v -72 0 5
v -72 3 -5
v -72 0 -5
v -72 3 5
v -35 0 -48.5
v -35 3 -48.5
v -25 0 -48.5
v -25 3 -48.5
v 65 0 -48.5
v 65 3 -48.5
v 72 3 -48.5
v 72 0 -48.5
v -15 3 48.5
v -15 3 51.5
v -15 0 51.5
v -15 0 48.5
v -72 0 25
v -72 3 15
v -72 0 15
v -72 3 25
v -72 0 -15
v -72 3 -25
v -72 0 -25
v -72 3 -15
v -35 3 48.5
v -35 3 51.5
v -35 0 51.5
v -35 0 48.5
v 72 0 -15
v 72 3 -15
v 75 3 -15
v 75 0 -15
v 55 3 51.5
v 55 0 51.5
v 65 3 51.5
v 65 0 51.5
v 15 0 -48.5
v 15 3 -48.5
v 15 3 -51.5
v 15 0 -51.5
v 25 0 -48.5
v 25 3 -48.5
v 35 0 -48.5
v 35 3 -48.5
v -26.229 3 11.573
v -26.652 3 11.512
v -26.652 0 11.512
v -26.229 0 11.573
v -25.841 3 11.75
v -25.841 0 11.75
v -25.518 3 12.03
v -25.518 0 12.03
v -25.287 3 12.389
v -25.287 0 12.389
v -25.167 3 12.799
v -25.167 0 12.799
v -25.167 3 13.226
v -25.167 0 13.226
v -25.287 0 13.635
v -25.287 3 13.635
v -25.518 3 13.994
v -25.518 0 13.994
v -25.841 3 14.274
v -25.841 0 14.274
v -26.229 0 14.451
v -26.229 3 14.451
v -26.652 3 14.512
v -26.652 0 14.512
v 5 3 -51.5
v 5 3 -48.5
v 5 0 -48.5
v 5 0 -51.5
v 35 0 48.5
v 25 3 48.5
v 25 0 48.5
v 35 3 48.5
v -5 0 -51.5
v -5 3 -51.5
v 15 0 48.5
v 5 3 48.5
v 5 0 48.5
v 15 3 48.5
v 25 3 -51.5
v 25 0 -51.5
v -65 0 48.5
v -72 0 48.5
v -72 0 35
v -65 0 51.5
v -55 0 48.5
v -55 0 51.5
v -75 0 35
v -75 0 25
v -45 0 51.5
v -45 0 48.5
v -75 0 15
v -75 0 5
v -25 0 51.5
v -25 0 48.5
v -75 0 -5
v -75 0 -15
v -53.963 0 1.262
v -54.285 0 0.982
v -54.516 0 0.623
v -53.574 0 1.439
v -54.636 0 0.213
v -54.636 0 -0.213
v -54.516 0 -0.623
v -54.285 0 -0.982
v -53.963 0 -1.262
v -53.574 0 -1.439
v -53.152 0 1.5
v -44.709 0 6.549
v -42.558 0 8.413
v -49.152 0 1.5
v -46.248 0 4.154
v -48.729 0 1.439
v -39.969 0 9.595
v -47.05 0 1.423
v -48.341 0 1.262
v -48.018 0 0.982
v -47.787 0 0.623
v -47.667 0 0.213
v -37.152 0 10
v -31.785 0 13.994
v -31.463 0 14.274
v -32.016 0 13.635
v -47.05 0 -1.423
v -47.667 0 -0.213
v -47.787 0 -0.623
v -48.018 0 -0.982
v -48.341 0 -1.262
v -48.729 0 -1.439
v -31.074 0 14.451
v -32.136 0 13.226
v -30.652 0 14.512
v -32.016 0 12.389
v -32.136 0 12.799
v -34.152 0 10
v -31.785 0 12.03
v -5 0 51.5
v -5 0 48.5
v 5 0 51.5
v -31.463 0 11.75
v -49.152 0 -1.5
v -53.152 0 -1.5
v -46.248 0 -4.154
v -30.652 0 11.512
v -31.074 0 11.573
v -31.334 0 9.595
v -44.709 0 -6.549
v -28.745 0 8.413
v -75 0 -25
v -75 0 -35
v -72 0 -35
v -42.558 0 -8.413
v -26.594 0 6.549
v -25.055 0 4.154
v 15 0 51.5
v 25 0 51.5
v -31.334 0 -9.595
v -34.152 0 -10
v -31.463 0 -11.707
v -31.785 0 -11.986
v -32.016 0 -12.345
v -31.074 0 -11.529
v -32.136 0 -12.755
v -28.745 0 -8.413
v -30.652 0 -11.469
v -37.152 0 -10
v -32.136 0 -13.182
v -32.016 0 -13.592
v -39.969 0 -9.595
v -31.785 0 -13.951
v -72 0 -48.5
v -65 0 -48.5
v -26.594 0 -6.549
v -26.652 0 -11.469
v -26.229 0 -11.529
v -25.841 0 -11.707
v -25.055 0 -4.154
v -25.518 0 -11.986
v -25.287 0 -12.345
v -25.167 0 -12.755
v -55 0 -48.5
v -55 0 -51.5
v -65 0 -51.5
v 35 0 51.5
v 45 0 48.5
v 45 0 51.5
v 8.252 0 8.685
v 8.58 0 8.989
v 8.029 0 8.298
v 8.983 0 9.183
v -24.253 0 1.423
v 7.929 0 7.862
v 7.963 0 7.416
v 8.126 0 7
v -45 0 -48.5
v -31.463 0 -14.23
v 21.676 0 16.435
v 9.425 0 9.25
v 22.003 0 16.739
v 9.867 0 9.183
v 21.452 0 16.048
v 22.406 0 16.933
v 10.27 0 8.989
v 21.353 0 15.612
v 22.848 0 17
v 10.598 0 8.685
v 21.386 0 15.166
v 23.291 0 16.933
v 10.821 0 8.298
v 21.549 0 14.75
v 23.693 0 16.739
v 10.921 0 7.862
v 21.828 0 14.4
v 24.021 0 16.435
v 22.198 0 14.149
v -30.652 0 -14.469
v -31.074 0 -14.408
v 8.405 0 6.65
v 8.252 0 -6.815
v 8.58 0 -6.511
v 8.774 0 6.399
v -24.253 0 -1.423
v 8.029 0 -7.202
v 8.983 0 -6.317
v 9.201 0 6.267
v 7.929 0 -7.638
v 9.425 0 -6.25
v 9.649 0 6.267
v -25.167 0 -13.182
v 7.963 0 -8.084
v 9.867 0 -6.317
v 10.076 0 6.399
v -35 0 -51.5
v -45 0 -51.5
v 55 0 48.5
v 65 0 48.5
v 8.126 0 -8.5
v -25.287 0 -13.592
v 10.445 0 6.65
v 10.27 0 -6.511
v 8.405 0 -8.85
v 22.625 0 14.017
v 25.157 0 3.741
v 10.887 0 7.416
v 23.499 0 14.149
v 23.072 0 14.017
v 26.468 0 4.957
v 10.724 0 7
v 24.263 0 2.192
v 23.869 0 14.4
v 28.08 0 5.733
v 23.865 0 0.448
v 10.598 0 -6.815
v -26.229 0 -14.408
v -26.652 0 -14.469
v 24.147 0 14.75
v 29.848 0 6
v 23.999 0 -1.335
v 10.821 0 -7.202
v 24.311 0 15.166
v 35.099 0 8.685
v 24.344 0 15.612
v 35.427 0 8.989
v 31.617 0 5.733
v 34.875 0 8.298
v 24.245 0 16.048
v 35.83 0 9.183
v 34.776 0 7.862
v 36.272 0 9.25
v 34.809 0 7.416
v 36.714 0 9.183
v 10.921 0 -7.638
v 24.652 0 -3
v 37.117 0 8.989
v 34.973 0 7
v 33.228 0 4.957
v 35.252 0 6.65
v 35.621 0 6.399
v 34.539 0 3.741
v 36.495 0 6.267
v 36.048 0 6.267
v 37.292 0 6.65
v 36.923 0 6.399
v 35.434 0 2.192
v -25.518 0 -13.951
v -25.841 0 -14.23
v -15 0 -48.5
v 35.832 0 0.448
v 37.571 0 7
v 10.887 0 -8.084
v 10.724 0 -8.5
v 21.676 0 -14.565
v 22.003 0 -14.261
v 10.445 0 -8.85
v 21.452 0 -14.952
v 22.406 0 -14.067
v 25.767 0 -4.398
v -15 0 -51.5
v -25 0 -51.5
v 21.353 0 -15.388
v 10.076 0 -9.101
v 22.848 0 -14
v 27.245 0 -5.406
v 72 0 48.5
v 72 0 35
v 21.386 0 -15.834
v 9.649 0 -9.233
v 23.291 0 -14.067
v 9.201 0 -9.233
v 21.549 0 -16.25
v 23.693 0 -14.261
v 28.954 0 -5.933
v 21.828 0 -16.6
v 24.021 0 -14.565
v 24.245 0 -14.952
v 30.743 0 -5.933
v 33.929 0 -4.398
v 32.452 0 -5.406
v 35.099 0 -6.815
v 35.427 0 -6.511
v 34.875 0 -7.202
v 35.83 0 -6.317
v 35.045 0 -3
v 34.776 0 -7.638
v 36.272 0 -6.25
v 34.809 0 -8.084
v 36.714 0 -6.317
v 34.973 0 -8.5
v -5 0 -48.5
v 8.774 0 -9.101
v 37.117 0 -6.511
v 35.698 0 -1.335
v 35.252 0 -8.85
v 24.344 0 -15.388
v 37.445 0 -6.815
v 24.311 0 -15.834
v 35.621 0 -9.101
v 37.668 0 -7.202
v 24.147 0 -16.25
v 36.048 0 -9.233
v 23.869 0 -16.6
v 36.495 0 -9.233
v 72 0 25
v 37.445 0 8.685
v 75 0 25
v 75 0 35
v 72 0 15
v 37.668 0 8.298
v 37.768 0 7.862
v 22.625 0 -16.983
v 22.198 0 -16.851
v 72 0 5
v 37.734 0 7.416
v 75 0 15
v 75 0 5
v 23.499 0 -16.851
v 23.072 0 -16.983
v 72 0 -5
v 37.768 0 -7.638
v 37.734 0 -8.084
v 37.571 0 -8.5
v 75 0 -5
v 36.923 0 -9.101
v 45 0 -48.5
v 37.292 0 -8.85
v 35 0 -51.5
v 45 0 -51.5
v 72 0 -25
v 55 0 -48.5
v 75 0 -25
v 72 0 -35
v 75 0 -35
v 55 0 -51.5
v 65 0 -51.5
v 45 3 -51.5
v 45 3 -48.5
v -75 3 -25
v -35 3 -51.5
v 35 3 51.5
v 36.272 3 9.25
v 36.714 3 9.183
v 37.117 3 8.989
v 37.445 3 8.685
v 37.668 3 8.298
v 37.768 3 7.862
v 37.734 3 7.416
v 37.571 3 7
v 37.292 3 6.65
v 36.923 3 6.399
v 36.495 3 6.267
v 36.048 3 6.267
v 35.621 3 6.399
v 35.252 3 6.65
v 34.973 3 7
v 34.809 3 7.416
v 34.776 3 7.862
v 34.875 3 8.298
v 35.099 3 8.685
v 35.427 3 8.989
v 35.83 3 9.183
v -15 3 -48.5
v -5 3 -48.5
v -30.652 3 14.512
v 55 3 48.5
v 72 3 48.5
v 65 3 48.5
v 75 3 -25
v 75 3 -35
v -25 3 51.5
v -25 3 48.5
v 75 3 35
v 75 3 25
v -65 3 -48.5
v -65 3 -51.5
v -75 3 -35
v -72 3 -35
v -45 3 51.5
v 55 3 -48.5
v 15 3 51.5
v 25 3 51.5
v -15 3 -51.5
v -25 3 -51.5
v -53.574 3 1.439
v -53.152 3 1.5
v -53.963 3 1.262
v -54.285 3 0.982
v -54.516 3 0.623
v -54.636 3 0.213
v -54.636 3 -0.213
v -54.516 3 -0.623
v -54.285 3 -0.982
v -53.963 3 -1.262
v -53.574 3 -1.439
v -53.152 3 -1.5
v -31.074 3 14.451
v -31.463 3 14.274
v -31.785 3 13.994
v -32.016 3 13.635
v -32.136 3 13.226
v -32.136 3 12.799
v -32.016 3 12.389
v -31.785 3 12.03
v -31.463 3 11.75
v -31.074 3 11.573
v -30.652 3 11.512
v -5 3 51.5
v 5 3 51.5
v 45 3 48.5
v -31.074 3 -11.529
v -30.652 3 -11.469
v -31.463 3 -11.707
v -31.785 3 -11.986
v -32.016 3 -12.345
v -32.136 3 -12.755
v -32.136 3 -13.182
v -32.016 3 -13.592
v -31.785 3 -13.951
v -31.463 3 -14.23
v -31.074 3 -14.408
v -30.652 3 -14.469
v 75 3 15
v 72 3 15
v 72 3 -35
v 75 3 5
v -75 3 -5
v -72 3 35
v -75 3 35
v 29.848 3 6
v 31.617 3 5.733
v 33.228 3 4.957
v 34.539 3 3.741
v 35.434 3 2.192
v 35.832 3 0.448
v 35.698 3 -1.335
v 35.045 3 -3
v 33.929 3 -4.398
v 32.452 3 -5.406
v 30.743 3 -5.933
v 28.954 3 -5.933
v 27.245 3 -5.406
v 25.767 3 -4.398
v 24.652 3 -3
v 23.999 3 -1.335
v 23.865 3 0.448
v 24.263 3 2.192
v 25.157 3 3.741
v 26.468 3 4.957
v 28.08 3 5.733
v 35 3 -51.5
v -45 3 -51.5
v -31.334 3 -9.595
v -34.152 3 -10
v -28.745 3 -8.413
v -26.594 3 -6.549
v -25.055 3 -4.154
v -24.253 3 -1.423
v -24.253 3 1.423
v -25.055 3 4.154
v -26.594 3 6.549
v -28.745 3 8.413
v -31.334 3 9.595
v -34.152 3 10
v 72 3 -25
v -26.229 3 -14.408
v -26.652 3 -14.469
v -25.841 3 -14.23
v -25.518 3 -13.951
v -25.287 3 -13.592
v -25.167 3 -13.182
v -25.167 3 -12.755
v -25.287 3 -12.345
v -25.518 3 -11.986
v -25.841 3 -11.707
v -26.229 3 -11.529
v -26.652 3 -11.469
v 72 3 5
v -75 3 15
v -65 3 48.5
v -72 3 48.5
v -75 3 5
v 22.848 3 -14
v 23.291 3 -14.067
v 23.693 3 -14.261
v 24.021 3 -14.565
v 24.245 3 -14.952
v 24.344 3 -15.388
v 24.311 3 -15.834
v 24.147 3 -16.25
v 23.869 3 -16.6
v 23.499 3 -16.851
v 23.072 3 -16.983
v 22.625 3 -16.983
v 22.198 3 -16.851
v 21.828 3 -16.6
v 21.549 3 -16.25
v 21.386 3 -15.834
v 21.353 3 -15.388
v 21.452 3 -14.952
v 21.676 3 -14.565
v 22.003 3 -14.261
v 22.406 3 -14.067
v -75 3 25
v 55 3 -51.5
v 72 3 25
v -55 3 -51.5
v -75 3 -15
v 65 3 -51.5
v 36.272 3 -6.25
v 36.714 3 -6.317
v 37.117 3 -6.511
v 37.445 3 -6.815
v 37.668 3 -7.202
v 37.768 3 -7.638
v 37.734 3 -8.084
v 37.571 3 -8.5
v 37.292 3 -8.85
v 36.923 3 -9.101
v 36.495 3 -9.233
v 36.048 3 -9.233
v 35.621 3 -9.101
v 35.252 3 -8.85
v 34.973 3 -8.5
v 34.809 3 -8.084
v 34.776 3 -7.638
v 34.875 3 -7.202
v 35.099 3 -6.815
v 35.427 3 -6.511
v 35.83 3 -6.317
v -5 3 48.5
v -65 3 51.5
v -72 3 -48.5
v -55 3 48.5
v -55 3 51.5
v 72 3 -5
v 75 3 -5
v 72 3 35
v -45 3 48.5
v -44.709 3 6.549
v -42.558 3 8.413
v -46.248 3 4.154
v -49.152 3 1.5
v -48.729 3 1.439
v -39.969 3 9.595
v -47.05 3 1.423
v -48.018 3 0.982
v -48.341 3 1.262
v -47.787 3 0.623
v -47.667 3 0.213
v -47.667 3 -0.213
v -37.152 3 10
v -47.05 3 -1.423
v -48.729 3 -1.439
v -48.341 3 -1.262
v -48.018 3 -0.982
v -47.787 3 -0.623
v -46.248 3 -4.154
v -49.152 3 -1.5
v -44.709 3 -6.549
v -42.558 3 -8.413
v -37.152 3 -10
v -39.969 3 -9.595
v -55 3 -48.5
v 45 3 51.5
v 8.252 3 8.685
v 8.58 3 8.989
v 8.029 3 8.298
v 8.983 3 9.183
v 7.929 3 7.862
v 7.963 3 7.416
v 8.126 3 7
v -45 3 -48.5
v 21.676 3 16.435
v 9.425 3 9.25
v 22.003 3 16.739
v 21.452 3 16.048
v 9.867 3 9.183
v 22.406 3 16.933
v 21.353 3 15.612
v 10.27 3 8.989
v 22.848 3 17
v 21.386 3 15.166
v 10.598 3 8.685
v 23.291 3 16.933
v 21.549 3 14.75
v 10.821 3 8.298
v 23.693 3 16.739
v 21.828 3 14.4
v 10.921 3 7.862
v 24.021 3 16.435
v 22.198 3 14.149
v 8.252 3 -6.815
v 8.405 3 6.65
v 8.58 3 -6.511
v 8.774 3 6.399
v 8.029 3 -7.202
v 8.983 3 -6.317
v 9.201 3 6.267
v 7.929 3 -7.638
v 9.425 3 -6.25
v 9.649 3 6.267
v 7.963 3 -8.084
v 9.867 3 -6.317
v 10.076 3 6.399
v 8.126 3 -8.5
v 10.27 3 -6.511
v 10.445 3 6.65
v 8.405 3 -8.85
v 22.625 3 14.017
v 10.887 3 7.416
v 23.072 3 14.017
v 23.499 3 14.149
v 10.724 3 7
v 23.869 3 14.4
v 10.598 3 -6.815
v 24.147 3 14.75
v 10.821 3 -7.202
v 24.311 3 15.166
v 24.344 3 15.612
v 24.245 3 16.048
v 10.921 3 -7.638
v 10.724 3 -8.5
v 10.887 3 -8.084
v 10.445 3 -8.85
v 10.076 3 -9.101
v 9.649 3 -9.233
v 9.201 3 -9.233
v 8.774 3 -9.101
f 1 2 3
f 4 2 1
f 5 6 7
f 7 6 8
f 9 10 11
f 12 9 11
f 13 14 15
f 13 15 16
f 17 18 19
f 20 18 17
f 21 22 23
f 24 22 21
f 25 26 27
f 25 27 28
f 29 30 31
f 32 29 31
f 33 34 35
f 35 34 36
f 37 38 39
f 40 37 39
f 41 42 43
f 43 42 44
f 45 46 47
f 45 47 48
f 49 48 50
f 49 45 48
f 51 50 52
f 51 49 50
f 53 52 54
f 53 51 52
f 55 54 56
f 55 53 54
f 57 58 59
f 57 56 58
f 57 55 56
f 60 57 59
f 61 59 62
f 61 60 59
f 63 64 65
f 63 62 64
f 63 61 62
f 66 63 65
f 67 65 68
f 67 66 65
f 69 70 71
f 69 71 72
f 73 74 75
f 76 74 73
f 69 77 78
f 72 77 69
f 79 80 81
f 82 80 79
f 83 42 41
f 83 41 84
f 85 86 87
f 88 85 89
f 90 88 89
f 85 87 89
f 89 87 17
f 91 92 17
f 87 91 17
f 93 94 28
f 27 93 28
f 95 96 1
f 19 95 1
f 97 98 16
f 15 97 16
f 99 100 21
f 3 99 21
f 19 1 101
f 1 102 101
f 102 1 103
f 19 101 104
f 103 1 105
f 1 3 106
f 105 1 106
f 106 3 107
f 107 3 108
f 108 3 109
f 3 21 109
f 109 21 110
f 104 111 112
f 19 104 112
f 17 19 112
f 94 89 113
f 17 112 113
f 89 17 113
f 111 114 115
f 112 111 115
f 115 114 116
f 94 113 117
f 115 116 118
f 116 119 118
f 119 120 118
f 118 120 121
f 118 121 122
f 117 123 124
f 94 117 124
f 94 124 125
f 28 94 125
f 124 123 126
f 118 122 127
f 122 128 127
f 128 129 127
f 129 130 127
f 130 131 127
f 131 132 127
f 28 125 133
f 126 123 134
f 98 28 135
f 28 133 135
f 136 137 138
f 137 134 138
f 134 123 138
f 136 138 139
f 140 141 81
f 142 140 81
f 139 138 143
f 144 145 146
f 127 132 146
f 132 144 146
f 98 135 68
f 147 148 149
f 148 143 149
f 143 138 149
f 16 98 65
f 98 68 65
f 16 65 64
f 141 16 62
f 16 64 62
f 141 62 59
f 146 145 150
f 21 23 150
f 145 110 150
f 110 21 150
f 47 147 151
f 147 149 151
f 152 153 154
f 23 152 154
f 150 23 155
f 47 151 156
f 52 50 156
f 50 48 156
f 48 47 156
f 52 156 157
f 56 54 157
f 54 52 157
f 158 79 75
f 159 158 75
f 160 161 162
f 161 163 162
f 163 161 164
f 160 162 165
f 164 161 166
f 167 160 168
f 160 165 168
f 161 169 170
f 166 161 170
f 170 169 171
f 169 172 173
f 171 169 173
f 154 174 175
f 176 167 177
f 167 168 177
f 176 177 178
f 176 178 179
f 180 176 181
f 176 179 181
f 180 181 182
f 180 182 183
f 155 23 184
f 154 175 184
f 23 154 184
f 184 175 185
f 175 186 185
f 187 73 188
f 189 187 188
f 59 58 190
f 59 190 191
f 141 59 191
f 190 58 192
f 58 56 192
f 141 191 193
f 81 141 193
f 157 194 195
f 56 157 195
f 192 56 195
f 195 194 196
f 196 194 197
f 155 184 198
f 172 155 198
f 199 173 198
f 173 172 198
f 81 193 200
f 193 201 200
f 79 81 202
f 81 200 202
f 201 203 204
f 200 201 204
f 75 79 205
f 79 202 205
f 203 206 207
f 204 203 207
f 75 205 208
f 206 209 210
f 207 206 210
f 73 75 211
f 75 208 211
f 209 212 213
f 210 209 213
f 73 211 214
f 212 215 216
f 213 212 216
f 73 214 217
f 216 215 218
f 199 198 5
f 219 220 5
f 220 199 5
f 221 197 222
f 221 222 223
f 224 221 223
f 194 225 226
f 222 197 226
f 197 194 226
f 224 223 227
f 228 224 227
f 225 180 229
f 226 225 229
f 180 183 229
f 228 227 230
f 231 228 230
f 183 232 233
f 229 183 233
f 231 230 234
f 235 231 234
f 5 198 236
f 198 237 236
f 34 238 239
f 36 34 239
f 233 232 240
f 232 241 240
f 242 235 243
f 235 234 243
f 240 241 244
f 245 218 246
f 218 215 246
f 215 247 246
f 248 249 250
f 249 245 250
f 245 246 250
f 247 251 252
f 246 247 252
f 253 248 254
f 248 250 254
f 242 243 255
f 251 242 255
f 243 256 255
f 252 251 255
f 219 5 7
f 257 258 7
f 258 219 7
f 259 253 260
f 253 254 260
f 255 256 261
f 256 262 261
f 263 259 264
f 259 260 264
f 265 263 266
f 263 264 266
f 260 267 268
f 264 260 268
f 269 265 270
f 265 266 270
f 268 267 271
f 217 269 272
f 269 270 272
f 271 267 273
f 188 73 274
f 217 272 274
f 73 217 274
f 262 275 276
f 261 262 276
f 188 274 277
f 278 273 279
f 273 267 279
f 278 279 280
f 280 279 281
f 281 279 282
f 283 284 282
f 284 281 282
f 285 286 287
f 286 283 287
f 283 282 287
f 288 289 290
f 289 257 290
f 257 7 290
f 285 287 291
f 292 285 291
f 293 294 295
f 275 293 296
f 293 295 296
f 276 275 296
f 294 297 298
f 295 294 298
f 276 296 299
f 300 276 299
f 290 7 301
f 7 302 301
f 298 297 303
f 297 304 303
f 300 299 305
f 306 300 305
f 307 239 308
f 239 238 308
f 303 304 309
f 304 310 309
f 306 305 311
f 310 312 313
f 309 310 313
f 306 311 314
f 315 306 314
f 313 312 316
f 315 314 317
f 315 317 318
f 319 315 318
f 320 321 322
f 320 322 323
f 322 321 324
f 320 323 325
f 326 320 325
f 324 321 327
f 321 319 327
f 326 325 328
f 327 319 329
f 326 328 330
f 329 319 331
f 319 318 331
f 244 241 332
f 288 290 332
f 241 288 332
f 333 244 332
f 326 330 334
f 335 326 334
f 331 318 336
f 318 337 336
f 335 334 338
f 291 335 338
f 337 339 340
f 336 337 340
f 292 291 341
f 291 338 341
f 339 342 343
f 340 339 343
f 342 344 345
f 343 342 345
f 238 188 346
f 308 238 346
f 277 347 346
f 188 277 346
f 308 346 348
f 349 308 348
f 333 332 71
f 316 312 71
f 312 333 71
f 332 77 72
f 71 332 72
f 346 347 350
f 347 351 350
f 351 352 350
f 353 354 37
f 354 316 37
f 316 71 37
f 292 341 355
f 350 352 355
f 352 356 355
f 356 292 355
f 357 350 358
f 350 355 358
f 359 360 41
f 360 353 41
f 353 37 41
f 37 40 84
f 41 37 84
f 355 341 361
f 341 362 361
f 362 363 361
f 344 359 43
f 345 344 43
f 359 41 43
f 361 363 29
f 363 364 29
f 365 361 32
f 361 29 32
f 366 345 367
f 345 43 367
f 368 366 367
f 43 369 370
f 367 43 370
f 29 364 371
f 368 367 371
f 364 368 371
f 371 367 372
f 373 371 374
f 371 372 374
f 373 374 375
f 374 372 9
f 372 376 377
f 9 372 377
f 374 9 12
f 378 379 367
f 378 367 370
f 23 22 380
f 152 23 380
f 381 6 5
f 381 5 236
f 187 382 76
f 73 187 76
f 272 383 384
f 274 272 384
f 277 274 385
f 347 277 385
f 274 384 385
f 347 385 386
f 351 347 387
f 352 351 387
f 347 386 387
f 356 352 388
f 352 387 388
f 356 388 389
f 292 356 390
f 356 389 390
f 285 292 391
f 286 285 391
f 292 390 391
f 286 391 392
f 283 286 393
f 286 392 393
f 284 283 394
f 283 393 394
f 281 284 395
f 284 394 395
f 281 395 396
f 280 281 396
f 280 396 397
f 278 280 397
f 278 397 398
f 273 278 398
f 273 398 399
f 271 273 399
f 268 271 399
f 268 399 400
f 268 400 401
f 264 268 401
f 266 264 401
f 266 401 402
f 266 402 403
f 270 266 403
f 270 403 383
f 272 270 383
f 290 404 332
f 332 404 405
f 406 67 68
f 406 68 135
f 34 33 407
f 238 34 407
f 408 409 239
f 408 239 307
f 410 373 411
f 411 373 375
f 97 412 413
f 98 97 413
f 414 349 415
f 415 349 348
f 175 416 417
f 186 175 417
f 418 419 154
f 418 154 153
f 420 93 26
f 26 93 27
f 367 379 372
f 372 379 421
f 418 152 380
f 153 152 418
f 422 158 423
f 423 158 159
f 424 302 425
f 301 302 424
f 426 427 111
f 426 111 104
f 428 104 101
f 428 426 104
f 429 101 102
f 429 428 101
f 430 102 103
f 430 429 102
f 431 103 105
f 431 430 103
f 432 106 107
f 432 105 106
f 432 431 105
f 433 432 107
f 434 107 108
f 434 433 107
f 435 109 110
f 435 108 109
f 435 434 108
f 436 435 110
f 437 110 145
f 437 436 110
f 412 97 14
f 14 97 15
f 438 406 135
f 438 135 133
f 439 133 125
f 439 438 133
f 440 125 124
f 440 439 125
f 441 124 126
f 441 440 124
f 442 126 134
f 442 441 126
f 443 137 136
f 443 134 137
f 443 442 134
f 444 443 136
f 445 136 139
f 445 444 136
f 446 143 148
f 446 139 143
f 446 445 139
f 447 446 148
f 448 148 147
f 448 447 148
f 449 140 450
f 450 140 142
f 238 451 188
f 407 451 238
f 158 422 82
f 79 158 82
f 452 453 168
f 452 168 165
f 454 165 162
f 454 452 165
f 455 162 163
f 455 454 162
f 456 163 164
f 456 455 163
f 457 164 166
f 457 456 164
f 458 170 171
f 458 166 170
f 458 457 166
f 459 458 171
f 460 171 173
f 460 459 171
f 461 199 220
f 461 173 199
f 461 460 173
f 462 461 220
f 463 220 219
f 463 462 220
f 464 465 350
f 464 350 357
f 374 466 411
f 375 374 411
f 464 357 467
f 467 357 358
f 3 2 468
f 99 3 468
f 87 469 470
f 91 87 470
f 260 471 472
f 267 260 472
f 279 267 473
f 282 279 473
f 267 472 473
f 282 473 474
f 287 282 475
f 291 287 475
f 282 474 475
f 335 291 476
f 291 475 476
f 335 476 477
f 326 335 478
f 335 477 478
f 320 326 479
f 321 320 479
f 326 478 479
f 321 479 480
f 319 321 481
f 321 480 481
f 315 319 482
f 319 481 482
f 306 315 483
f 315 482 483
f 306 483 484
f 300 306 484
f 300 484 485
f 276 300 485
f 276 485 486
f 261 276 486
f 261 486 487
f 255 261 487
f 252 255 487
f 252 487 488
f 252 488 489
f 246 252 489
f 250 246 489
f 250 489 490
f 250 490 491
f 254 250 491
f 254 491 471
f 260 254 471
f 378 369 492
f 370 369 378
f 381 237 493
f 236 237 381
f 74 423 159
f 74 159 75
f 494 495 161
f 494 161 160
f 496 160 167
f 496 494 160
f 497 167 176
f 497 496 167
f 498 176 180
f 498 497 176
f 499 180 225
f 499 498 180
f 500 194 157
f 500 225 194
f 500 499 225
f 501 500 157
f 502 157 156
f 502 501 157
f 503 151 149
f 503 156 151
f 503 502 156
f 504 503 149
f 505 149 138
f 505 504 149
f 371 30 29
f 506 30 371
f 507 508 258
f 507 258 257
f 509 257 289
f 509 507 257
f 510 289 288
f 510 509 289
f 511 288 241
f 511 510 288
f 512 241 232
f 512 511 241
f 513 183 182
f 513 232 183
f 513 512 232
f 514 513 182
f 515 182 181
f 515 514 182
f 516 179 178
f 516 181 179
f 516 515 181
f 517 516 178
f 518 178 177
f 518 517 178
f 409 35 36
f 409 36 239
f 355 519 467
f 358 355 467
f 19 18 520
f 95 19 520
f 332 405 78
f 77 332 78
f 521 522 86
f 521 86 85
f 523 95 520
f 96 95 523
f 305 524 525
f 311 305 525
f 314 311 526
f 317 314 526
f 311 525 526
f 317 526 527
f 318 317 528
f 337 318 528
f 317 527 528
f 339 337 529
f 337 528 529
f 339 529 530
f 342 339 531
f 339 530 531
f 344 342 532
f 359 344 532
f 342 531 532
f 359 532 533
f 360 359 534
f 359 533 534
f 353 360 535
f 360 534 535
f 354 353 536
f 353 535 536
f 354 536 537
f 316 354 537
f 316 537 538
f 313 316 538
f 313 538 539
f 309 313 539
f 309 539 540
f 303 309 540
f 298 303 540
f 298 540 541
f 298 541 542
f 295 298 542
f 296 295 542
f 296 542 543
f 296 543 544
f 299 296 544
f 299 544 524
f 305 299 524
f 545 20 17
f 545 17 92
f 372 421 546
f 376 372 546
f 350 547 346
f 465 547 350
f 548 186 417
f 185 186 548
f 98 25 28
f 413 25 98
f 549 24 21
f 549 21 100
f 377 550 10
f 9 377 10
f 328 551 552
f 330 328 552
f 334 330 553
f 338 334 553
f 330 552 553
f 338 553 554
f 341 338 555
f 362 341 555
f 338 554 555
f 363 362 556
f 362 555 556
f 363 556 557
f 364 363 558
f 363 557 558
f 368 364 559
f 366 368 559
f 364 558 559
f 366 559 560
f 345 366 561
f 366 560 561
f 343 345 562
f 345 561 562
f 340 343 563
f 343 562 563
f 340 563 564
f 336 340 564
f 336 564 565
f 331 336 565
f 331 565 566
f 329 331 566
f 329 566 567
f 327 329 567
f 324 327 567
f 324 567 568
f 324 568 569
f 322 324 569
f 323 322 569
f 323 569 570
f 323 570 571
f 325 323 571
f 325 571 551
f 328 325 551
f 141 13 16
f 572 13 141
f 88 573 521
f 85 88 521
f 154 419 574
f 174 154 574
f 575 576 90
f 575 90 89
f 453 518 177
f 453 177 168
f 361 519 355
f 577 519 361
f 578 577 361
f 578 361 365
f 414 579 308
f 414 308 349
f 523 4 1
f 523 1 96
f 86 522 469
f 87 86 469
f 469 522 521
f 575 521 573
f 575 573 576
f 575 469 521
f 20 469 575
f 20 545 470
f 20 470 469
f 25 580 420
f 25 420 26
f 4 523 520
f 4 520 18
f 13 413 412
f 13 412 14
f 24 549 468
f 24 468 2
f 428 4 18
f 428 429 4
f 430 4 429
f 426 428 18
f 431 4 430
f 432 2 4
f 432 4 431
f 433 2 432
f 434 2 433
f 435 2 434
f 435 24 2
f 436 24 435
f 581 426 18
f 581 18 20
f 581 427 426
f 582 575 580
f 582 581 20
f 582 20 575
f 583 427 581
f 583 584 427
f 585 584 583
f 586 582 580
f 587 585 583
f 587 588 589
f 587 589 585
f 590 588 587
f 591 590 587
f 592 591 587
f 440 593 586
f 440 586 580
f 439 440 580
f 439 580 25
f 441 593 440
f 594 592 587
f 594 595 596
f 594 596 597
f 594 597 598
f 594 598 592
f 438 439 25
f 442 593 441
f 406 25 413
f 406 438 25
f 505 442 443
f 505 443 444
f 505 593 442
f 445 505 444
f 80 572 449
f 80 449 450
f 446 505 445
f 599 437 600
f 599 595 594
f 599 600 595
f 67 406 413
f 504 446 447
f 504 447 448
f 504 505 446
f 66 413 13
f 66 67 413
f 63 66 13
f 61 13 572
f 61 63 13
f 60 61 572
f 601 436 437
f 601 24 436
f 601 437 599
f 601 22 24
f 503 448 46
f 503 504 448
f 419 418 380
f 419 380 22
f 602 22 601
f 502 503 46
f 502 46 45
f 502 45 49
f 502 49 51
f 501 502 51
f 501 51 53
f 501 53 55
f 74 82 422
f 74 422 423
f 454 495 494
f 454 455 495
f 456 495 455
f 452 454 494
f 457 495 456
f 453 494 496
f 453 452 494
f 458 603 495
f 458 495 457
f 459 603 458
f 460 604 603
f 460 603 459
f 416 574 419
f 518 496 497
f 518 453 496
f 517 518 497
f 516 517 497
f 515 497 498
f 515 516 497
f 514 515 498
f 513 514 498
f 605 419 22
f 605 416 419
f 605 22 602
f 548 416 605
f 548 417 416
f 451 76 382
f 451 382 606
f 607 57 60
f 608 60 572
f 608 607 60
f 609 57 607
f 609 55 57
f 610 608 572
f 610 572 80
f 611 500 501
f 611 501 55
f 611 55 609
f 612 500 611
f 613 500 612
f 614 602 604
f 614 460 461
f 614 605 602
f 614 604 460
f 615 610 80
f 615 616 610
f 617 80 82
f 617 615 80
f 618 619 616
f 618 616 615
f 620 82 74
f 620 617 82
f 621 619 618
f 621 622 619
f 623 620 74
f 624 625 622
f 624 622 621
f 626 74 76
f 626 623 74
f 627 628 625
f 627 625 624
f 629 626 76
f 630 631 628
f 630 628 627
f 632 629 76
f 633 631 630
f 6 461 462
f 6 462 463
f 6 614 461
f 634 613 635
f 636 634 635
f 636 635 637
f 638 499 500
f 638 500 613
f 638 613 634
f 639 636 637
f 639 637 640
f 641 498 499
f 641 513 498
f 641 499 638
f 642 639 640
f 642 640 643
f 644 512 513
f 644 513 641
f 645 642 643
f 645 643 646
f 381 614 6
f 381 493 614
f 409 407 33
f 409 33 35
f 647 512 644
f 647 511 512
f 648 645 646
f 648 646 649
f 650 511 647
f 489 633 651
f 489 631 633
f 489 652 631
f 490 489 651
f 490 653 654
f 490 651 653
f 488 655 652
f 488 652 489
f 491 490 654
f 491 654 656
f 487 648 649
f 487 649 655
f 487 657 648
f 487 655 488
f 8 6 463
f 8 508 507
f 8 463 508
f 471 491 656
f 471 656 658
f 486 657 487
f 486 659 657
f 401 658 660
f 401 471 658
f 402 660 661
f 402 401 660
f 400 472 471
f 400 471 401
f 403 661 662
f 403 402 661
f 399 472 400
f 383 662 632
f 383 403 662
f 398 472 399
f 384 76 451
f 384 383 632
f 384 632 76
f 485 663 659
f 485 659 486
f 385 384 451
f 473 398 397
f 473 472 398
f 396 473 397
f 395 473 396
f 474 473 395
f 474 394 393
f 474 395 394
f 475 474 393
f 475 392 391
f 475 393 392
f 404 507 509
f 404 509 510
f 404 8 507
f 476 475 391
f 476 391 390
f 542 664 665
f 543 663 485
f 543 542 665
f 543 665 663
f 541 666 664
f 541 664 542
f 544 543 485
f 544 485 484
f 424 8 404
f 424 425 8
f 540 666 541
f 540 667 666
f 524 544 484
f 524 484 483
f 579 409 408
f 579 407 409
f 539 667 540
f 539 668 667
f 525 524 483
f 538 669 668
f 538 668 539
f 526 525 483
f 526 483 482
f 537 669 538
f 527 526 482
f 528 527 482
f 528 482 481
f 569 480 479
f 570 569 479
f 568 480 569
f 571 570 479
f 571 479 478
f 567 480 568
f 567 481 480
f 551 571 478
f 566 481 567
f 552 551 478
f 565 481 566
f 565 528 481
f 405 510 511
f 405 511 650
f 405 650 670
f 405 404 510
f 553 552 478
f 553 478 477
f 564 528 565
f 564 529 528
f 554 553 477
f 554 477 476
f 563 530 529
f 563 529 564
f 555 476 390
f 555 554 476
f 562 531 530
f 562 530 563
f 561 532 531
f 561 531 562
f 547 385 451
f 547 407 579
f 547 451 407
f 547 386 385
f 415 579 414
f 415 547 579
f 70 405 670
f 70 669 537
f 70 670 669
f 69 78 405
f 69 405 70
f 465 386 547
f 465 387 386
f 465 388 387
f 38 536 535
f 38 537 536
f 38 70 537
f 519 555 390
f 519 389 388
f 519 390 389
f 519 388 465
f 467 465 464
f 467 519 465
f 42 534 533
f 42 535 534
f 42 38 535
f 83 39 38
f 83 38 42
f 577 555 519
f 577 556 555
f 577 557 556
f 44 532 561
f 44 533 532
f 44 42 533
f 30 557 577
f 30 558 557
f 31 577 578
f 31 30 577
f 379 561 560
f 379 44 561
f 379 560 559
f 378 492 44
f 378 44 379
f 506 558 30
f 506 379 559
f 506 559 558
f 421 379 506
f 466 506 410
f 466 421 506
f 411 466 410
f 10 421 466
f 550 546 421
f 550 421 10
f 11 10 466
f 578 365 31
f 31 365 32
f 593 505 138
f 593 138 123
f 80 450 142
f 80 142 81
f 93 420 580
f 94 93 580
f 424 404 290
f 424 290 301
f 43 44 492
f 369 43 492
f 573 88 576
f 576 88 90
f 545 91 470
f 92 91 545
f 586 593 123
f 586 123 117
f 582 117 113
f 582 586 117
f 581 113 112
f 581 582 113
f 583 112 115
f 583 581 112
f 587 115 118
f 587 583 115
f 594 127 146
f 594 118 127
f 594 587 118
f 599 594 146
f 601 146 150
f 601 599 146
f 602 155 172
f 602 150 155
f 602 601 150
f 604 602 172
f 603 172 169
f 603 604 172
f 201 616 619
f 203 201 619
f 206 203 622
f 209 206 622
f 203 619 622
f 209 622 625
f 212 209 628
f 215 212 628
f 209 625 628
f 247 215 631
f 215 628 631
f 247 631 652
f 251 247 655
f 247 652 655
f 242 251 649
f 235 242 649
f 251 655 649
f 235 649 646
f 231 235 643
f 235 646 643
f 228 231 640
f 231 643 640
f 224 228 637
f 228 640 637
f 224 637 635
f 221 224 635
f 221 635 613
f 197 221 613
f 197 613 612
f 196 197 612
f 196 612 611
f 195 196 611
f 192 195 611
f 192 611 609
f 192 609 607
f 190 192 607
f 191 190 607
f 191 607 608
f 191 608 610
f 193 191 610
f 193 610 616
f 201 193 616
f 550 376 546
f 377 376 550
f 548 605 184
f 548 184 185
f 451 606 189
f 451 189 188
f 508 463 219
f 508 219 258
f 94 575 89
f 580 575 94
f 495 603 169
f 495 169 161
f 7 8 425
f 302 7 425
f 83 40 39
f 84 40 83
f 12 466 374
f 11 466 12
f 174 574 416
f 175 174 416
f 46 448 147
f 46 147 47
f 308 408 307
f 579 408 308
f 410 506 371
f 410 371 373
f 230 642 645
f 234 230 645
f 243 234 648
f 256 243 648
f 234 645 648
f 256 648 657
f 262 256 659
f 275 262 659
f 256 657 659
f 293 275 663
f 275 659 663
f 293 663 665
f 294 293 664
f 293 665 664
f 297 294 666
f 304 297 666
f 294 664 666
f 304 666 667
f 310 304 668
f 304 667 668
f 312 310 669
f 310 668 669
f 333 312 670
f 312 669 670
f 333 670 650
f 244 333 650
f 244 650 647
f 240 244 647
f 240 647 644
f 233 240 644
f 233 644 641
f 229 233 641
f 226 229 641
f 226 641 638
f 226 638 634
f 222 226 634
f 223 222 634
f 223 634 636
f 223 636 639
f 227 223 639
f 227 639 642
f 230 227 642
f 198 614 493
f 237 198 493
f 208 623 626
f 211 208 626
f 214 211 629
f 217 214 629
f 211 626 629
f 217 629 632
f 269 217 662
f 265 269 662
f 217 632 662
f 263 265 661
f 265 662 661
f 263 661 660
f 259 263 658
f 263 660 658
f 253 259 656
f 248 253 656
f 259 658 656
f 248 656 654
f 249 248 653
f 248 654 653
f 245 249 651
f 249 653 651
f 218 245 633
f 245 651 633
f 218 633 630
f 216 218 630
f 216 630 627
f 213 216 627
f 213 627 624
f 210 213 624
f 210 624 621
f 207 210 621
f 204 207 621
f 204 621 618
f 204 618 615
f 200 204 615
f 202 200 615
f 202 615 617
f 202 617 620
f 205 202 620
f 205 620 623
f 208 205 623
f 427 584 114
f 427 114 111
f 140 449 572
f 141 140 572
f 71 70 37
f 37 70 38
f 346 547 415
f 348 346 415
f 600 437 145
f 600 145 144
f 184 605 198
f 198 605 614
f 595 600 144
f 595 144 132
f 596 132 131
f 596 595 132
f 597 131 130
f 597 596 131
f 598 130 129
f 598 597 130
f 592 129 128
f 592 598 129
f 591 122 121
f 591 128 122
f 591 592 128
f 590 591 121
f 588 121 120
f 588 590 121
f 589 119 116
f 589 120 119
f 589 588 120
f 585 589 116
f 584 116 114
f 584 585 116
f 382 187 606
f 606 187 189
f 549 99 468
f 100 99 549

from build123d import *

# Parameters (mm, degrees)
SKETCH1_W                 = 150
SKETCH1_H                 = 103
BOSS_EXTRUDE1_DEPTH       = 3
SKETCH2_W                 = 10
SKETCH2_H                 = 3
CUT_EXTRUDE1_DEPTH        = 92.028841583
LPATTERN1_COUNT           = 8
LPATTERN1_PITCH           = 20
MIRROR1_COPY_1_SKETCH_W   = 10
MIRROR1_COPY_1_SKETCH_H   = 3
MIRROR1_COPY_1_DEPTH      = 92.028841583
MIRROR1_COPY_2_SKETCH_W   = 10
MIRROR1_COPY_2_SKETCH_H   = 3
MIRROR1_COPY_2_DEPTH      = 92.028841583
MIRROR1_COPY_3_SKETCH_W   = 10
MIRROR1_COPY_3_SKETCH_H   = 3
MIRROR1_COPY_3_DEPTH      = 92.028841583
MIRROR1_COPY_4_SKETCH_W   = 10
MIRROR1_COPY_4_SKETCH_H   = 3
MIRROR1_COPY_4_DEPTH      = 92.028841583
MIRROR1_COPY_5_SKETCH_W   = 10
MIRROR1_COPY_5_SKETCH_H   = 3
MIRROR1_COPY_5_DEPTH      = 92.028841583
MIRROR1_COPY_6_SKETCH_W   = 10
MIRROR1_COPY_6_SKETCH_H   = 3
MIRROR1_COPY_6_DEPTH      = 92.028841583
MIRROR1_COPY_7_SKETCH_W   = 10
MIRROR1_COPY_7_SKETCH_H   = 3
MIRROR1_COPY_7_DEPTH      = 92.028841583
SKETCH3_W                 = 3
SKETCH3_H                 = 10
CUT_EXTRUDE2_DEPTH        = 92.028841583
LPATTERN2_COUNT           = 5
LPATTERN2_PITCH           = 20
MIRROR2_COPY_1_SKETCH_W   = 3
MIRROR2_COPY_1_SKETCH_H   = 10
MIRROR2_COPY_1_DEPTH      = 92.028841583
MIRROR2_COPY_2_SKETCH_W   = 3
MIRROR2_COPY_2_SKETCH_H   = 10
MIRROR2_COPY_2_DEPTH      = 92.028841583
MIRROR2_COPY_3_SKETCH_W   = 3
MIRROR2_COPY_3_SKETCH_H   = 10
MIRROR2_COPY_3_DEPTH      = 92.028841583
MIRROR2_COPY_4_SKETCH_W   = 3
MIRROR2_COPY_4_SKETCH_H   = 10
MIRROR2_COPY_4_DEPTH      = 92.028841583
SKETCH4_W                 = 3
SKETCH4_H                 = 3.5
CUT_EXTRUDE3_DEPTH        = 92.028841583
SKETCH7_R                 = 6
SKETCH7_R_2               = 1.5
CUT_EXTRUDE4_DEPTH        = 92.028841583
M3X0_5_TAPPED_HOLE3_D     = 3
M3X0_5_TAPPED_HOLE3_DEPTH = 10
M3X0_5_TAPPED_HOLE3_TIP   = 0.901290929


with BuildPart() as part:
    # Sketch1 → Boss-Extrude1 (new body)
    with BuildSketch(Plane(origin=(0, 0, 0), x_dir=(1, 0, 0), z_dir=(0, 1, 0))):
        Rectangle(SKETCH1_W, SKETCH1_H)
    extrude(amount=BOSS_EXTRUDE1_DEPTH)

    # Sketch2 → Cut-Extrude1 (cut, through all)
    with BuildSketch(Plane(origin=(0, 3, 0), x_dir=(1, 0, 0), z_dir=(0, 1, 0))):
        with Locations((70, -50)):
            Rectangle(SKETCH2_W, SKETCH2_H)
    cut_extrude1 = extrude(amount=-CUT_EXTRUDE1_DEPTH, mode=Mode.SUBTRACT)

    # LPattern1: Cut-Extrude1 ×8
    with Locations(*[(-i * LPATTERN1_PITCH, 0, 0) for i in range(1, LPATTERN1_COUNT)]):
        add(cut_extrude1, mode=Mode.SUBTRACT)

    # Mirror1: Cut-Extrude1 across plane
    add(cut_extrude1.mirror(Plane.XY), mode=Mode.SUBTRACT)

    # Mirror1 copy 1 sketch → Mirror1 copy 1 (cut, through all)
    with BuildSketch(Plane(origin=(-20, 3, 0), x_dir=(1, 0, 0), z_dir=(0, 1, 0))):
        with Locations((70, 50)):
            Rectangle(MIRROR1_COPY_1_SKETCH_W, MIRROR1_COPY_1_SKETCH_H)
    extrude(amount=-MIRROR1_COPY_1_DEPTH, mode=Mode.SUBTRACT)

    # Mirror1 copy 2 sketch → Mirror1 copy 2 (cut, through all)
    with BuildSketch(Plane(origin=(-40, 3, 0), x_dir=(1, 0, 0), z_dir=(0, 1, 0))):
        with Locations((70, 50)):
            Rectangle(MIRROR1_COPY_2_SKETCH_W, MIRROR1_COPY_2_SKETCH_H)
    extrude(amount=-MIRROR1_COPY_2_DEPTH, mode=Mode.SUBTRACT)

    # Mirror1 copy 3 sketch → Mirror1 copy 3 (cut, through all)
    with BuildSketch(Plane(origin=(-60, 3, 0), x_dir=(1, 0, 0), z_dir=(0, 1, 0))):
        with Locations((70, 50)):
            Rectangle(MIRROR1_COPY_3_SKETCH_W, MIRROR1_COPY_3_SKETCH_H)
    extrude(amount=-MIRROR1_COPY_3_DEPTH, mode=Mode.SUBTRACT)

    # Mirror1 copy 4 sketch → Mirror1 copy 4 (cut, through all)
    with BuildSketch(Plane(origin=(-80, 3, 0), x_dir=(1, 0, 0), z_dir=(0, 1, 0))):
        with Locations((70, 50)):
            Rectangle(MIRROR1_COPY_4_SKETCH_W, MIRROR1_COPY_4_SKETCH_H)
    extrude(amount=-MIRROR1_COPY_4_DEPTH, mode=Mode.SUBTRACT)

    # Mirror1 copy 5 sketch → Mirror1 copy 5 (cut, through all)
    with BuildSketch(Plane(origin=(-100, 3, 0), x_dir=(1, 0, 0), z_dir=(0, 1, 0))):
        with Locations((70, 50)):
            Rectangle(MIRROR1_COPY_5_SKETCH_W, MIRROR1_COPY_5_SKETCH_H)
    extrude(amount=-MIRROR1_COPY_5_DEPTH, mode=Mode.SUBTRACT)

    # Mirror1 copy 6 sketch → Mirror1 copy 6 (cut, through all)
    with BuildSketch(Plane(origin=(-120, 3, 0), x_dir=(1, 0, 0), z_dir=(0, 1, 0))):
        with Locations((70, 50)):
            Rectangle(MIRROR1_COPY_6_SKETCH_W, MIRROR1_COPY_6_SKETCH_H)
    extrude(amount=-MIRROR1_COPY_6_DEPTH, mode=Mode.SUBTRACT)

    # Mirror1 copy 7 sketch → Mirror1 copy 7 (cut, through all)
    with BuildSketch(Plane(origin=(-140, 3, 0), x_dir=(1, 0, 0), z_dir=(0, 1, 0))):
        with Locations((70, 50)):
            Rectangle(MIRROR1_COPY_7_SKETCH_W, MIRROR1_COPY_7_SKETCH_H)
    extrude(amount=-MIRROR1_COPY_7_DEPTH, mode=Mode.SUBTRACT)

    # Sketch3 → Cut-Extrude2 (cut, through all)
    with BuildSketch(Plane(origin=(0, 3, 0), x_dir=(1, 0, 0), z_dir=(0, 1, 0))):
        with Locations((73.5, 40)):
            Rectangle(SKETCH3_W, SKETCH3_H)
    cut_extrude2 = extrude(amount=-CUT_EXTRUDE2_DEPTH, mode=Mode.SUBTRACT)

    # LPattern2: Cut-Extrude2 ×5
    with Locations(*[(0, 0, i * LPATTERN2_PITCH) for i in range(1, LPATTERN2_COUNT)]):
        add(cut_extrude2, mode=Mode.SUBTRACT)

    # Mirror2: Cut-Extrude2 across plane
    add(cut_extrude2.mirror(Plane(origin=(0, 0, 0), x_dir=(0, 0, 1), z_dir=(1, 0, 0))), mode=Mode.SUBTRACT)

    # Mirror2 copy 1 sketch → Mirror2 copy 1 (cut, through all)
    with BuildSketch(Plane(origin=(0, 3, 20), x_dir=(-1, 0, 0), z_dir=(0, 1, 0))):
        with Locations((73.5, -40)):
            Rectangle(MIRROR2_COPY_1_SKETCH_W, MIRROR2_COPY_1_SKETCH_H)
    extrude(amount=-MIRROR2_COPY_1_DEPTH, mode=Mode.SUBTRACT)

    # Mirror2 copy 2 sketch → Mirror2 copy 2 (cut, through all)
    with BuildSketch(Plane(origin=(0, 3, 40), x_dir=(-1, 0, 0), z_dir=(0, 1, 0))):
        with Locations((73.5, -40)):
            Rectangle(MIRROR2_COPY_2_SKETCH_W, MIRROR2_COPY_2_SKETCH_H)
    extrude(amount=-MIRROR2_COPY_2_DEPTH, mode=Mode.SUBTRACT)

    # Mirror2 copy 3 sketch → Mirror2 copy 3 (cut, through all)
    with BuildSketch(Plane(origin=(0, 3, 60), x_dir=(-1, 0, 0), z_dir=(0, 1, 0))):
        with Locations((73.5, -40)):
            Rectangle(MIRROR2_COPY_3_SKETCH_W, MIRROR2_COPY_3_SKETCH_H)
    extrude(amount=-MIRROR2_COPY_3_DEPTH, mode=Mode.SUBTRACT)

    # Mirror2 copy 4 sketch → Mirror2 copy 4 (cut, through all)
    with BuildSketch(Plane(origin=(0, 3, 80), x_dir=(-1, 0, 0), z_dir=(0, 1, 0))):
        with Locations((73.5, -40)):
            Rectangle(MIRROR2_COPY_4_SKETCH_W, MIRROR2_COPY_4_SKETCH_H)
    extrude(amount=-MIRROR2_COPY_4_DEPTH, mode=Mode.SUBTRACT)

    # Sketch4 → Cut-Extrude3 (cut, through all)
    with BuildSketch(Plane(origin=(0, 3, 0), x_dir=(1, 0, 0), z_dir=(0, 1, 0))):
        with Locations((73.5, 46.75)):
            Rectangle(SKETCH4_W, SKETCH4_H)
        with Locations((-73.5, 46.75)):
            Rectangle(SKETCH4_W, SKETCH4_H)
        with Locations((-73.5, -46.75)):
            Rectangle(SKETCH4_W, SKETCH4_H)
        with Locations((73.5, -46.75)):
            Rectangle(SKETCH4_W, SKETCH4_H)
    extrude(amount=-CUT_EXTRUDE3_DEPTH, mode=Mode.SUBTRACT)

    # Sketch7 → Cut-Extrude4 (cut, through all)
    with BuildSketch(Plane(origin=(0, 3, 0), x_dir=(1, 0, 0), z_dir=(0, 1, 0))):
        with Locations(Location((29.848397993, 0, 0), (0, 0, 270))):
            Circle(SKETCH7_R)
        with Locations(Location((22.848397993, 15.5, 0), (0, 0, 270))):
            Circle(SKETCH7_R_2)
        with Locations(Location((36.271791752, 7.75, 0), (0, 0, 270))):
            Circle(SKETCH7_R_2)
        with Locations(Location((36.271791752, -7.75, 0), (0, 0, 270))):
            Circle(SKETCH7_R_2)
        with Locations(Location((22.848397993, -15.5, 0), (0, 0, 270))):
            Circle(SKETCH7_R_2)
        with Locations(Location((9.425004235, -7.75, 0), (0, 0, 270))):
            Circle(SKETCH7_R_2)
        with Locations(Location((9.425004235, 7.75, 0), (0, 0, 270))):
            Circle(SKETCH7_R_2)
        with BuildLine():
            Line((-34.151602007, -10), (-37.151602007, -10))
            ThreePointArc((-37.151602007, -10), (-47.151602007, 0), (-37.151602007, 10))
            Line((-37.151602007, 10), (-34.151602007, 10))
            ThreePointArc((-34.151602007, 10), (-24.151602007, 0), (-34.151602007, -10))
        make_face()
        with BuildLine():
            Line((-49.151602007, -1.5), (-53.151602007, -1.5))
            ThreePointArc((-53.151602007, -1.5), (-54.651602007, 0), (-53.151602007, 1.5))
            Line((-53.151602007, 1.5), (-49.151602007, 1.5))
            ThreePointArc((-49.151602007, 1.5), (-47.651602007, 0), (-49.151602007, -1.5))
        make_face()
        with BuildLine():
            Line((-26.651602007, 11.4685656), (-30.651602007, 11.4685656))
            ThreePointArc((-30.651602007, 11.4685656), (-32.151602007, 12.9685656), (-30.651602007, 14.4685656))
            Line((-30.651602007, 14.4685656), (-26.651602007, 14.4685656))
            ThreePointArc((-26.651602007, 14.4685656), (-25.151602007, 12.9685656), (-26.651602007, 11.4685656))
        make_face()
        with BuildLine():
            Line((-26.651602007, -14.512196514), (-30.651602007, -14.512196514))
            ThreePointArc((-30.651602007, -14.512196514), (-32.151602007, -13.012196514), (-30.651602007, -11.512196514))
            Line((-30.651602007, -11.512196514), (-26.651602007, -11.512196514))
            ThreePointArc((-26.651602007, -11.512196514), (-25.151602007, -13.012196514), (-26.651602007, -14.512196514))
        make_face()
    extrude(amount=-CUT_EXTRUDE4_DEPTH, mode=Mode.SUBTRACT)

    # M3x0.5 Tapped Hole3
    with Locations(Plane(origin=(0, 3, 0), x_dir=(1, 0, 0), z_dir=(0, 1, 0))):
        with Locations((22.848397993, 15.5), (36.271791752, -7.75), (22.848397993, -15.5), (9.425004235, -7.75), (9.425004235, 7.75), (36.271791752, 7.75)):
            Hole(M3X0_5_TAPPED_HOLE3_D / 2, depth=M3X0_5_TAPPED_HOLE3_DEPTH)
            with Locations((0, 0, -(M3X0_5_TAPPED_HOLE3_DEPTH + M3X0_5_TAPPED_HOLE3_TIP / 2))):  # 118° drill point
                Cone(0, M3X0_5_TAPPED_HOLE3_D / 2, M3X0_5_TAPPED_HOLE3_TIP, mode=Mode.SUBTRACT)


solid = part.part
